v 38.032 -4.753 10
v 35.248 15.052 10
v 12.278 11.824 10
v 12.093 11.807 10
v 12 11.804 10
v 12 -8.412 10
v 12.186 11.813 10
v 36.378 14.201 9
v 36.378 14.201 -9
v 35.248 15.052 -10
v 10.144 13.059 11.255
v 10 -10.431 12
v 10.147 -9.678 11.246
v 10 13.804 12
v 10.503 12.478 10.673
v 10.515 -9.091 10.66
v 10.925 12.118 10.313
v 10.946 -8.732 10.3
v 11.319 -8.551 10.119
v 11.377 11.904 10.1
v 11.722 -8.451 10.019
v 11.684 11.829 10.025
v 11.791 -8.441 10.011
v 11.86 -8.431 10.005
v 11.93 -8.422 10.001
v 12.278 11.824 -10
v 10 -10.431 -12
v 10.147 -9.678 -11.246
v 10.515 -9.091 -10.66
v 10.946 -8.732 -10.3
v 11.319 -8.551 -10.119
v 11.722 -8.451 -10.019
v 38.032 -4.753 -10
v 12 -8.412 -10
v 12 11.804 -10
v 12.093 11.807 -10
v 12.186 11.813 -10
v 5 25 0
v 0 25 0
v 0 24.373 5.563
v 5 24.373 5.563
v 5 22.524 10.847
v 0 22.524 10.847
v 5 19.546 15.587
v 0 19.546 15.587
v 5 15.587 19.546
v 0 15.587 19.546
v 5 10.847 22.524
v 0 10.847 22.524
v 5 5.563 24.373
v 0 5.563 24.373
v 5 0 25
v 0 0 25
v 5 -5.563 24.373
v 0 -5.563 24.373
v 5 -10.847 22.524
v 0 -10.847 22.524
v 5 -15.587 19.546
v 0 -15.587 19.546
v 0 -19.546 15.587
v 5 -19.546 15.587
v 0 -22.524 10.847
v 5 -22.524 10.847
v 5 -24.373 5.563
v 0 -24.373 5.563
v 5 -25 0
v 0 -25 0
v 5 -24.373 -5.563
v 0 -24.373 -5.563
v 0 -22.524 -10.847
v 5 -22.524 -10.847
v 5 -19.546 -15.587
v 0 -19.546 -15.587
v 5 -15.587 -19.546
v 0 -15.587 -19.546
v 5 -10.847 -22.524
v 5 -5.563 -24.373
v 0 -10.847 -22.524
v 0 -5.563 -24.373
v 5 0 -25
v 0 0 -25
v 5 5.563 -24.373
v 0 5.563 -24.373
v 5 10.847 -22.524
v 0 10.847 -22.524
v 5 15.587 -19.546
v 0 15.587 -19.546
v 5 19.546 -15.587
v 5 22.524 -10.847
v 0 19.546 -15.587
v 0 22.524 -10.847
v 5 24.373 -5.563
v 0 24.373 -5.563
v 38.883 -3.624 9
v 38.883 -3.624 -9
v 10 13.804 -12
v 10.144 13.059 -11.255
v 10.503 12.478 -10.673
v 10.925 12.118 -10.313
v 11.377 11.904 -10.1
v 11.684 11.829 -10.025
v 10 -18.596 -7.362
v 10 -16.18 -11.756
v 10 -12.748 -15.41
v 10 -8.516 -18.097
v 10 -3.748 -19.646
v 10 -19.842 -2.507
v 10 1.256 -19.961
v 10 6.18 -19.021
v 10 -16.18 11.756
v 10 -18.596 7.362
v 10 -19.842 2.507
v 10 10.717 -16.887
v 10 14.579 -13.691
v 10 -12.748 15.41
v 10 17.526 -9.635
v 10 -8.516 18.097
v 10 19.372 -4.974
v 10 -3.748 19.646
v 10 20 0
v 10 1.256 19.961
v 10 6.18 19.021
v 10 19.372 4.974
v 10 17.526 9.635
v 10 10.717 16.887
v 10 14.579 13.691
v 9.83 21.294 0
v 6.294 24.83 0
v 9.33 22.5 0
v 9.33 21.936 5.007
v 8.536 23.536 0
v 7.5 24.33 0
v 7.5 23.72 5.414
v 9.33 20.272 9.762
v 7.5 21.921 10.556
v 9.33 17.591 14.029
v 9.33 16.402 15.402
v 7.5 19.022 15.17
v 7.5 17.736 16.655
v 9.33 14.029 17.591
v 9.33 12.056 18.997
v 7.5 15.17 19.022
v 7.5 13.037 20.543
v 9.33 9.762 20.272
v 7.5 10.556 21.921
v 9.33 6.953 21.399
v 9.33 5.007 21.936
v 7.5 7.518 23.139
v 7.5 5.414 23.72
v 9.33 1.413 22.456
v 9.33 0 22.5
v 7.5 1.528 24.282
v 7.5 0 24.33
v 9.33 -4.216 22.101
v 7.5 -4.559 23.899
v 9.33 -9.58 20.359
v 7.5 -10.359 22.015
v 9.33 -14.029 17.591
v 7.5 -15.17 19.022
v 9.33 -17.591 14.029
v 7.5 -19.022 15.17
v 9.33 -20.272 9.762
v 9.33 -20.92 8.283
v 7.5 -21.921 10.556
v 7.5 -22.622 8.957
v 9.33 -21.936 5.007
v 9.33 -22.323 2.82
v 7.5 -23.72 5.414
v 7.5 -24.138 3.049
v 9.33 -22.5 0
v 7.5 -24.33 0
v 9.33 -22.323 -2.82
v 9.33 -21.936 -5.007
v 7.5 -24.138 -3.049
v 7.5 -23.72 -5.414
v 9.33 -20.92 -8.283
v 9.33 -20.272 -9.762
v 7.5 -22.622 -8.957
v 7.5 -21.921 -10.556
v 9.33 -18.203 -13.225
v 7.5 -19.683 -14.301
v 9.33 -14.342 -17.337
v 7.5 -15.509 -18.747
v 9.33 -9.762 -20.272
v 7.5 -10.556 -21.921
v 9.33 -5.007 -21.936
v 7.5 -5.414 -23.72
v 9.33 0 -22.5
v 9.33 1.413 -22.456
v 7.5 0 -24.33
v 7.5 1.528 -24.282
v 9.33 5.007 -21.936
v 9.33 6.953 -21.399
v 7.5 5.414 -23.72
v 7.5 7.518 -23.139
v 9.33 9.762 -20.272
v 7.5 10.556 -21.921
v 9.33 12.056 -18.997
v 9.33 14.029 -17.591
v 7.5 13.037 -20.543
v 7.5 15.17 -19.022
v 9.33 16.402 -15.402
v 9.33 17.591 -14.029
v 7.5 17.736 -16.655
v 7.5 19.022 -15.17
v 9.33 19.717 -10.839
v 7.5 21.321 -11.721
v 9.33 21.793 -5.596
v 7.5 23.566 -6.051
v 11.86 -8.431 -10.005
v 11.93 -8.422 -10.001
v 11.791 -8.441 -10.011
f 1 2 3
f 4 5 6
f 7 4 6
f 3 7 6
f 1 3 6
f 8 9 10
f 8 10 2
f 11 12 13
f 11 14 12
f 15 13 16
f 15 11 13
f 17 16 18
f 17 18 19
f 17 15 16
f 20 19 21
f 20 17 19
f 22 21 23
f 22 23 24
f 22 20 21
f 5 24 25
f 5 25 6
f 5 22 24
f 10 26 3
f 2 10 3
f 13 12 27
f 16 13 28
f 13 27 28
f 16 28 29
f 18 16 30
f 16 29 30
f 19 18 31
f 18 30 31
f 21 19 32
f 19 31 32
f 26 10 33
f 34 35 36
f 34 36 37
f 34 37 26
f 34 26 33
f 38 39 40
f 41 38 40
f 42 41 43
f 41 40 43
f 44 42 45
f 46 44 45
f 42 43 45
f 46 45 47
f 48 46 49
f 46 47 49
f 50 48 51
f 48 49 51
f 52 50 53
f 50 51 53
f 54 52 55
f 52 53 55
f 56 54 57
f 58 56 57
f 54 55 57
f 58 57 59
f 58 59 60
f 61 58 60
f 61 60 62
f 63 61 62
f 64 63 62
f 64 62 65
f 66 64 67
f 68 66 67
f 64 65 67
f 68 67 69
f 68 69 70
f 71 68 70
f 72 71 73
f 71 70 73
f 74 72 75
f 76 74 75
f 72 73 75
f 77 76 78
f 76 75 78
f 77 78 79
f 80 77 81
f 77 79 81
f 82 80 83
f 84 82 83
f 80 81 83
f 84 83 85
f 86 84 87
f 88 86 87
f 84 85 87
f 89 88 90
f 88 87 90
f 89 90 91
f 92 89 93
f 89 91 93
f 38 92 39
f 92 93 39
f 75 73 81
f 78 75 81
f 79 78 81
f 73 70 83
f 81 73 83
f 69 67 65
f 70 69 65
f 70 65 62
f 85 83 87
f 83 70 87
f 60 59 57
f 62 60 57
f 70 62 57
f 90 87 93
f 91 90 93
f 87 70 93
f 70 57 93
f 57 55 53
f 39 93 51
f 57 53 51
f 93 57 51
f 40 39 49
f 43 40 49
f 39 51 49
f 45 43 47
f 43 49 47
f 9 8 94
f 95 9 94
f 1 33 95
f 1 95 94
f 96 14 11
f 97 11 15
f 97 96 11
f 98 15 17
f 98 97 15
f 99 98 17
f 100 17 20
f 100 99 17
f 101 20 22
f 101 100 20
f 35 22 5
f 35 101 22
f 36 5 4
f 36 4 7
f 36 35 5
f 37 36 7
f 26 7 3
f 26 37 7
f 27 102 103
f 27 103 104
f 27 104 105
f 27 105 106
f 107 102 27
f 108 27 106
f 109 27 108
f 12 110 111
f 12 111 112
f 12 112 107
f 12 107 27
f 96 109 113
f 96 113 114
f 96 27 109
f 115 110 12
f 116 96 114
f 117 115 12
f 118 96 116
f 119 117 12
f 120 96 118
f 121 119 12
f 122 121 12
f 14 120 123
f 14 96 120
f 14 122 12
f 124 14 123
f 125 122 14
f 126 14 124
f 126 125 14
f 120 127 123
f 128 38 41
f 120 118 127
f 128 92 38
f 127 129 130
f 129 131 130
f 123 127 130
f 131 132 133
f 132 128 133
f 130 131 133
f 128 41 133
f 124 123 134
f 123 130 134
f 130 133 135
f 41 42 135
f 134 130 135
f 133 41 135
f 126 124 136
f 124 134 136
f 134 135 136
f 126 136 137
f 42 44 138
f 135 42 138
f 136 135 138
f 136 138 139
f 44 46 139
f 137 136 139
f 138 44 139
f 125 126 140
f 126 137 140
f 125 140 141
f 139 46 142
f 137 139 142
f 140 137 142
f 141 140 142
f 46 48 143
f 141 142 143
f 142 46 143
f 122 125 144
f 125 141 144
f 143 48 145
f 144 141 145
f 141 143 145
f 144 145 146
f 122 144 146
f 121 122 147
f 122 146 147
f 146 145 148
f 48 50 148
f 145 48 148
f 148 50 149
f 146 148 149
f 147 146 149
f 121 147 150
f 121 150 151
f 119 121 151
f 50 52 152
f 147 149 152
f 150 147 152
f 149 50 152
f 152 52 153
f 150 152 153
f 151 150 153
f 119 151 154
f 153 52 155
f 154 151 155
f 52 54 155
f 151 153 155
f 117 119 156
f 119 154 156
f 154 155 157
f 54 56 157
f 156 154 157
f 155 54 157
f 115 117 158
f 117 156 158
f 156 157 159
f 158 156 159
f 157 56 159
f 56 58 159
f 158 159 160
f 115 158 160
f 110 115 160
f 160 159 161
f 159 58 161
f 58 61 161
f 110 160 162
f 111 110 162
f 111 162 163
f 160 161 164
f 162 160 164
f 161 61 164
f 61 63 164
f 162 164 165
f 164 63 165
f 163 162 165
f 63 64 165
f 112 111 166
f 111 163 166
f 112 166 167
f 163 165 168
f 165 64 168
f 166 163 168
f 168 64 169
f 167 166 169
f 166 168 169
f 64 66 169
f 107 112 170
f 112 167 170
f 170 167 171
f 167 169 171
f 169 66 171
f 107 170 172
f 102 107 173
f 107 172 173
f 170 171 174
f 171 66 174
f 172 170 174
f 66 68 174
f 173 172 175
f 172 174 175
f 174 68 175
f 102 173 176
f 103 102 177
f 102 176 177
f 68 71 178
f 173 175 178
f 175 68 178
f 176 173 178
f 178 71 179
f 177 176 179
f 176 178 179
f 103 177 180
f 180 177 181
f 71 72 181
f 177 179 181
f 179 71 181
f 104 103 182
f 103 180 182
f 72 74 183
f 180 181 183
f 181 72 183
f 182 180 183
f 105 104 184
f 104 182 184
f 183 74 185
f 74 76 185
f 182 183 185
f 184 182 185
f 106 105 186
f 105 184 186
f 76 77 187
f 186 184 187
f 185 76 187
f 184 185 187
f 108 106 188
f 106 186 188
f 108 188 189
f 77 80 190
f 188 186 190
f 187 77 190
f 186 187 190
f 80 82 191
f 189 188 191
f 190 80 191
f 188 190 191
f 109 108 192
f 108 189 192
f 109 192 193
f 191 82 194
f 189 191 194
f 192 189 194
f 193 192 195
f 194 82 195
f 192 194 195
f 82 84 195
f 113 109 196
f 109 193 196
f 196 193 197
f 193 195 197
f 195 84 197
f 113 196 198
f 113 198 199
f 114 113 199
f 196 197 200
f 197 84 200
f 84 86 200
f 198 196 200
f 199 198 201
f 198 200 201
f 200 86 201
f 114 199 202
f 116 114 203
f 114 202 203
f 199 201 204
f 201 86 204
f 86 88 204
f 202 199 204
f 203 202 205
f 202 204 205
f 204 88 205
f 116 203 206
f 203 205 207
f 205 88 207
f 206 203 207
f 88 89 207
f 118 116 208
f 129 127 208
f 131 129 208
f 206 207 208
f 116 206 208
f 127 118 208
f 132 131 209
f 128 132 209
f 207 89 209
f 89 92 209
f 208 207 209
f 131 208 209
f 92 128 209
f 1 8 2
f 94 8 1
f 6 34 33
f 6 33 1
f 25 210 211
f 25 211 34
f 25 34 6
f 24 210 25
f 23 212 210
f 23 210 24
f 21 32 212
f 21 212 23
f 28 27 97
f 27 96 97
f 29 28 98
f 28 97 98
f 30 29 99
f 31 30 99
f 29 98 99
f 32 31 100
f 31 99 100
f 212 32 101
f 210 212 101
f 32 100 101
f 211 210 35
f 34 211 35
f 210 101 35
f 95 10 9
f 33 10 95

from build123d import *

# Parameters (mm, degrees)
F0_R     = 25
F1_DEPTH = 10
F5_W     = 20
F5_H     = 20
F6_DEPTH = 31
F7_SIZE  = 1
F8_R     = 5
F9_R     = 2


# Not quite as in the source:
# - a feature names something its author has since deleted; it is built from what else it names


with BuildPart() as f1:
    # F0 (on Right) → F1 (new body)
    with BuildSketch(Plane.YZ):
        Circle(F0_R)
    extrude(amount=F1_DEPTH)

    # F5 (on offset) → F6 (join)
    with BuildSketch(Plane(origin=(6.9318764812, 0.9742117067, 0), x_dir=(0.139173101, -0.9902680687, 0), z_dir=(-0.9902680687, -0.139173101, 0))):
        Rectangle(F5_W, F5_H)
    extrude(amount=-F6_DEPTH)

    # F7
    f7_edges = [f1.edges().sort_by_distance(p)[0] for p in [
        (39.021918, -4.614103, 0),
        (37.630187, 5.288578, 10),
        (36.238456, 15.191259, 0),
        (37.630187, 5.288578, -10),
    ]]
    chamfer(f7_edges, length=F7_SIZE)

    # F8
    f8_edges = [f1.edges().sort_by_distance(p)[0] for p in [
        (10, -25, 0),
    ]]
    fillet(f8_edges, radius=F8_R)

    # F9
    f9_edges = [f1.edges().sort_by_distance(p)[0] for p in [
        (10, 1.405408, -10),
        (10, -8.692867, 0),
        (10, 1.405408, 10),
        (10, 11.503684, 0),
    ]]
    fillet(f9_edges, radius=F9_R)


solid = f1.part
